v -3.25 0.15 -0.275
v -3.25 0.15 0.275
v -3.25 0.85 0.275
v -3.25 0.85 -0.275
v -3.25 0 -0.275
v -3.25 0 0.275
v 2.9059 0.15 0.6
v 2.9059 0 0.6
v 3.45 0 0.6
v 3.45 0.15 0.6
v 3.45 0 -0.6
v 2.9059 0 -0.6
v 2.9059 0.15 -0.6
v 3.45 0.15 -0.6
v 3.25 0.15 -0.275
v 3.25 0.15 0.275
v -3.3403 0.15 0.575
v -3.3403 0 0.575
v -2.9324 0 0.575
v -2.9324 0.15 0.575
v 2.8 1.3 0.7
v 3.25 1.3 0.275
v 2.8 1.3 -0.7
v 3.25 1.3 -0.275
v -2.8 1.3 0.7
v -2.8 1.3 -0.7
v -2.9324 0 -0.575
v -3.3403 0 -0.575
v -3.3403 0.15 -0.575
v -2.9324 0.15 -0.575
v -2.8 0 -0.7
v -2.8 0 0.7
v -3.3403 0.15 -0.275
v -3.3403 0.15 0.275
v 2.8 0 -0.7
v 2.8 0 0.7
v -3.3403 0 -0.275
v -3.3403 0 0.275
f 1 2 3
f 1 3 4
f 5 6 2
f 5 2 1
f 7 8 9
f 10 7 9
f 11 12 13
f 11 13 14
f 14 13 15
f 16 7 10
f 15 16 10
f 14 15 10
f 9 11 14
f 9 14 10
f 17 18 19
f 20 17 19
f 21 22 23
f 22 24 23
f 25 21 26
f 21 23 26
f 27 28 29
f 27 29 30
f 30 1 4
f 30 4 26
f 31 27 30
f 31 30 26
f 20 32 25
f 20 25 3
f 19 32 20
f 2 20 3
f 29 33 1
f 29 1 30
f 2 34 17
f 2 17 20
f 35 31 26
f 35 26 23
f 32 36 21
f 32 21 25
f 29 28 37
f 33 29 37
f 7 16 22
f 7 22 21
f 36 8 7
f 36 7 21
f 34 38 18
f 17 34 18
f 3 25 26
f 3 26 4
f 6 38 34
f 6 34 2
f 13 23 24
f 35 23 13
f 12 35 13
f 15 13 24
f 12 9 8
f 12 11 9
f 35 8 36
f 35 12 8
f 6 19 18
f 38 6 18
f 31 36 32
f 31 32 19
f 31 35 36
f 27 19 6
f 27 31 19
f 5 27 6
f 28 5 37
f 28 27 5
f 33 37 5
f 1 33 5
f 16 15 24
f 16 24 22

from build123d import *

# Parameters (mm, degrees)
BOSS_EXTRUDE1_DEPTH = 1.3
CUT_EXTRUDE1_DEPTH  = 4.769946949
SKETCH4_W           = 0.6
SKETCH4_H           = 1.2
SKETCH4_W_2         = 0.55
SKETCH4_H_2         = 0.3
BOSS_EXTRUDE2_DEPTH = 0.15


with BuildPart() as part:
    # Sketch1 → Boss-Extrude1 (new body)
    with BuildSketch(Plane(origin=(0, 0, 0), x_dir=(1, 0, 0), z_dir=(0, 1, 0))):
        Polygon((2.8, -0.7), (-2.8, -0.7), (-3.25, -0.275), (-3.25, 0.275), (-2.8, 0.7), (2.8, 0.7), (3.25, 0.275), (3.25, -0.275), align=None)
    extrude(amount=BOSS_EXTRUDE1_DEPTH)

    # Sketch2 → Cut-Extrude1 (cut, through all)
    with BuildSketch(Plane.XY.offset(0.7)):
        Polygon((-2.8, 1.3), (-3.25, 0.85), (-3.487156898, 1.338767614), align=None)
    extrude(amount=-CUT_EXTRUDE1_DEPTH, mode=Mode.SUBTRACT)

    # Sketch4 → Boss-Extrude2 (add)
    with BuildSketch(Plane.XZ):
        with Locations((3.15, 0)):
            Rectangle(SKETCH4_W, SKETCH4_H)
        with Locations((-3.065339152, 0.425)):
            Rectangle(SKETCH4_W_2, SKETCH4_H_2)
        with Locations((-3.065339152, -0.425)):
            Rectangle(SKETCH4_W_2, SKETCH4_H_2)
    extrude(amount=-BOSS_EXTRUDE2_DEPTH)


solid = part.part
